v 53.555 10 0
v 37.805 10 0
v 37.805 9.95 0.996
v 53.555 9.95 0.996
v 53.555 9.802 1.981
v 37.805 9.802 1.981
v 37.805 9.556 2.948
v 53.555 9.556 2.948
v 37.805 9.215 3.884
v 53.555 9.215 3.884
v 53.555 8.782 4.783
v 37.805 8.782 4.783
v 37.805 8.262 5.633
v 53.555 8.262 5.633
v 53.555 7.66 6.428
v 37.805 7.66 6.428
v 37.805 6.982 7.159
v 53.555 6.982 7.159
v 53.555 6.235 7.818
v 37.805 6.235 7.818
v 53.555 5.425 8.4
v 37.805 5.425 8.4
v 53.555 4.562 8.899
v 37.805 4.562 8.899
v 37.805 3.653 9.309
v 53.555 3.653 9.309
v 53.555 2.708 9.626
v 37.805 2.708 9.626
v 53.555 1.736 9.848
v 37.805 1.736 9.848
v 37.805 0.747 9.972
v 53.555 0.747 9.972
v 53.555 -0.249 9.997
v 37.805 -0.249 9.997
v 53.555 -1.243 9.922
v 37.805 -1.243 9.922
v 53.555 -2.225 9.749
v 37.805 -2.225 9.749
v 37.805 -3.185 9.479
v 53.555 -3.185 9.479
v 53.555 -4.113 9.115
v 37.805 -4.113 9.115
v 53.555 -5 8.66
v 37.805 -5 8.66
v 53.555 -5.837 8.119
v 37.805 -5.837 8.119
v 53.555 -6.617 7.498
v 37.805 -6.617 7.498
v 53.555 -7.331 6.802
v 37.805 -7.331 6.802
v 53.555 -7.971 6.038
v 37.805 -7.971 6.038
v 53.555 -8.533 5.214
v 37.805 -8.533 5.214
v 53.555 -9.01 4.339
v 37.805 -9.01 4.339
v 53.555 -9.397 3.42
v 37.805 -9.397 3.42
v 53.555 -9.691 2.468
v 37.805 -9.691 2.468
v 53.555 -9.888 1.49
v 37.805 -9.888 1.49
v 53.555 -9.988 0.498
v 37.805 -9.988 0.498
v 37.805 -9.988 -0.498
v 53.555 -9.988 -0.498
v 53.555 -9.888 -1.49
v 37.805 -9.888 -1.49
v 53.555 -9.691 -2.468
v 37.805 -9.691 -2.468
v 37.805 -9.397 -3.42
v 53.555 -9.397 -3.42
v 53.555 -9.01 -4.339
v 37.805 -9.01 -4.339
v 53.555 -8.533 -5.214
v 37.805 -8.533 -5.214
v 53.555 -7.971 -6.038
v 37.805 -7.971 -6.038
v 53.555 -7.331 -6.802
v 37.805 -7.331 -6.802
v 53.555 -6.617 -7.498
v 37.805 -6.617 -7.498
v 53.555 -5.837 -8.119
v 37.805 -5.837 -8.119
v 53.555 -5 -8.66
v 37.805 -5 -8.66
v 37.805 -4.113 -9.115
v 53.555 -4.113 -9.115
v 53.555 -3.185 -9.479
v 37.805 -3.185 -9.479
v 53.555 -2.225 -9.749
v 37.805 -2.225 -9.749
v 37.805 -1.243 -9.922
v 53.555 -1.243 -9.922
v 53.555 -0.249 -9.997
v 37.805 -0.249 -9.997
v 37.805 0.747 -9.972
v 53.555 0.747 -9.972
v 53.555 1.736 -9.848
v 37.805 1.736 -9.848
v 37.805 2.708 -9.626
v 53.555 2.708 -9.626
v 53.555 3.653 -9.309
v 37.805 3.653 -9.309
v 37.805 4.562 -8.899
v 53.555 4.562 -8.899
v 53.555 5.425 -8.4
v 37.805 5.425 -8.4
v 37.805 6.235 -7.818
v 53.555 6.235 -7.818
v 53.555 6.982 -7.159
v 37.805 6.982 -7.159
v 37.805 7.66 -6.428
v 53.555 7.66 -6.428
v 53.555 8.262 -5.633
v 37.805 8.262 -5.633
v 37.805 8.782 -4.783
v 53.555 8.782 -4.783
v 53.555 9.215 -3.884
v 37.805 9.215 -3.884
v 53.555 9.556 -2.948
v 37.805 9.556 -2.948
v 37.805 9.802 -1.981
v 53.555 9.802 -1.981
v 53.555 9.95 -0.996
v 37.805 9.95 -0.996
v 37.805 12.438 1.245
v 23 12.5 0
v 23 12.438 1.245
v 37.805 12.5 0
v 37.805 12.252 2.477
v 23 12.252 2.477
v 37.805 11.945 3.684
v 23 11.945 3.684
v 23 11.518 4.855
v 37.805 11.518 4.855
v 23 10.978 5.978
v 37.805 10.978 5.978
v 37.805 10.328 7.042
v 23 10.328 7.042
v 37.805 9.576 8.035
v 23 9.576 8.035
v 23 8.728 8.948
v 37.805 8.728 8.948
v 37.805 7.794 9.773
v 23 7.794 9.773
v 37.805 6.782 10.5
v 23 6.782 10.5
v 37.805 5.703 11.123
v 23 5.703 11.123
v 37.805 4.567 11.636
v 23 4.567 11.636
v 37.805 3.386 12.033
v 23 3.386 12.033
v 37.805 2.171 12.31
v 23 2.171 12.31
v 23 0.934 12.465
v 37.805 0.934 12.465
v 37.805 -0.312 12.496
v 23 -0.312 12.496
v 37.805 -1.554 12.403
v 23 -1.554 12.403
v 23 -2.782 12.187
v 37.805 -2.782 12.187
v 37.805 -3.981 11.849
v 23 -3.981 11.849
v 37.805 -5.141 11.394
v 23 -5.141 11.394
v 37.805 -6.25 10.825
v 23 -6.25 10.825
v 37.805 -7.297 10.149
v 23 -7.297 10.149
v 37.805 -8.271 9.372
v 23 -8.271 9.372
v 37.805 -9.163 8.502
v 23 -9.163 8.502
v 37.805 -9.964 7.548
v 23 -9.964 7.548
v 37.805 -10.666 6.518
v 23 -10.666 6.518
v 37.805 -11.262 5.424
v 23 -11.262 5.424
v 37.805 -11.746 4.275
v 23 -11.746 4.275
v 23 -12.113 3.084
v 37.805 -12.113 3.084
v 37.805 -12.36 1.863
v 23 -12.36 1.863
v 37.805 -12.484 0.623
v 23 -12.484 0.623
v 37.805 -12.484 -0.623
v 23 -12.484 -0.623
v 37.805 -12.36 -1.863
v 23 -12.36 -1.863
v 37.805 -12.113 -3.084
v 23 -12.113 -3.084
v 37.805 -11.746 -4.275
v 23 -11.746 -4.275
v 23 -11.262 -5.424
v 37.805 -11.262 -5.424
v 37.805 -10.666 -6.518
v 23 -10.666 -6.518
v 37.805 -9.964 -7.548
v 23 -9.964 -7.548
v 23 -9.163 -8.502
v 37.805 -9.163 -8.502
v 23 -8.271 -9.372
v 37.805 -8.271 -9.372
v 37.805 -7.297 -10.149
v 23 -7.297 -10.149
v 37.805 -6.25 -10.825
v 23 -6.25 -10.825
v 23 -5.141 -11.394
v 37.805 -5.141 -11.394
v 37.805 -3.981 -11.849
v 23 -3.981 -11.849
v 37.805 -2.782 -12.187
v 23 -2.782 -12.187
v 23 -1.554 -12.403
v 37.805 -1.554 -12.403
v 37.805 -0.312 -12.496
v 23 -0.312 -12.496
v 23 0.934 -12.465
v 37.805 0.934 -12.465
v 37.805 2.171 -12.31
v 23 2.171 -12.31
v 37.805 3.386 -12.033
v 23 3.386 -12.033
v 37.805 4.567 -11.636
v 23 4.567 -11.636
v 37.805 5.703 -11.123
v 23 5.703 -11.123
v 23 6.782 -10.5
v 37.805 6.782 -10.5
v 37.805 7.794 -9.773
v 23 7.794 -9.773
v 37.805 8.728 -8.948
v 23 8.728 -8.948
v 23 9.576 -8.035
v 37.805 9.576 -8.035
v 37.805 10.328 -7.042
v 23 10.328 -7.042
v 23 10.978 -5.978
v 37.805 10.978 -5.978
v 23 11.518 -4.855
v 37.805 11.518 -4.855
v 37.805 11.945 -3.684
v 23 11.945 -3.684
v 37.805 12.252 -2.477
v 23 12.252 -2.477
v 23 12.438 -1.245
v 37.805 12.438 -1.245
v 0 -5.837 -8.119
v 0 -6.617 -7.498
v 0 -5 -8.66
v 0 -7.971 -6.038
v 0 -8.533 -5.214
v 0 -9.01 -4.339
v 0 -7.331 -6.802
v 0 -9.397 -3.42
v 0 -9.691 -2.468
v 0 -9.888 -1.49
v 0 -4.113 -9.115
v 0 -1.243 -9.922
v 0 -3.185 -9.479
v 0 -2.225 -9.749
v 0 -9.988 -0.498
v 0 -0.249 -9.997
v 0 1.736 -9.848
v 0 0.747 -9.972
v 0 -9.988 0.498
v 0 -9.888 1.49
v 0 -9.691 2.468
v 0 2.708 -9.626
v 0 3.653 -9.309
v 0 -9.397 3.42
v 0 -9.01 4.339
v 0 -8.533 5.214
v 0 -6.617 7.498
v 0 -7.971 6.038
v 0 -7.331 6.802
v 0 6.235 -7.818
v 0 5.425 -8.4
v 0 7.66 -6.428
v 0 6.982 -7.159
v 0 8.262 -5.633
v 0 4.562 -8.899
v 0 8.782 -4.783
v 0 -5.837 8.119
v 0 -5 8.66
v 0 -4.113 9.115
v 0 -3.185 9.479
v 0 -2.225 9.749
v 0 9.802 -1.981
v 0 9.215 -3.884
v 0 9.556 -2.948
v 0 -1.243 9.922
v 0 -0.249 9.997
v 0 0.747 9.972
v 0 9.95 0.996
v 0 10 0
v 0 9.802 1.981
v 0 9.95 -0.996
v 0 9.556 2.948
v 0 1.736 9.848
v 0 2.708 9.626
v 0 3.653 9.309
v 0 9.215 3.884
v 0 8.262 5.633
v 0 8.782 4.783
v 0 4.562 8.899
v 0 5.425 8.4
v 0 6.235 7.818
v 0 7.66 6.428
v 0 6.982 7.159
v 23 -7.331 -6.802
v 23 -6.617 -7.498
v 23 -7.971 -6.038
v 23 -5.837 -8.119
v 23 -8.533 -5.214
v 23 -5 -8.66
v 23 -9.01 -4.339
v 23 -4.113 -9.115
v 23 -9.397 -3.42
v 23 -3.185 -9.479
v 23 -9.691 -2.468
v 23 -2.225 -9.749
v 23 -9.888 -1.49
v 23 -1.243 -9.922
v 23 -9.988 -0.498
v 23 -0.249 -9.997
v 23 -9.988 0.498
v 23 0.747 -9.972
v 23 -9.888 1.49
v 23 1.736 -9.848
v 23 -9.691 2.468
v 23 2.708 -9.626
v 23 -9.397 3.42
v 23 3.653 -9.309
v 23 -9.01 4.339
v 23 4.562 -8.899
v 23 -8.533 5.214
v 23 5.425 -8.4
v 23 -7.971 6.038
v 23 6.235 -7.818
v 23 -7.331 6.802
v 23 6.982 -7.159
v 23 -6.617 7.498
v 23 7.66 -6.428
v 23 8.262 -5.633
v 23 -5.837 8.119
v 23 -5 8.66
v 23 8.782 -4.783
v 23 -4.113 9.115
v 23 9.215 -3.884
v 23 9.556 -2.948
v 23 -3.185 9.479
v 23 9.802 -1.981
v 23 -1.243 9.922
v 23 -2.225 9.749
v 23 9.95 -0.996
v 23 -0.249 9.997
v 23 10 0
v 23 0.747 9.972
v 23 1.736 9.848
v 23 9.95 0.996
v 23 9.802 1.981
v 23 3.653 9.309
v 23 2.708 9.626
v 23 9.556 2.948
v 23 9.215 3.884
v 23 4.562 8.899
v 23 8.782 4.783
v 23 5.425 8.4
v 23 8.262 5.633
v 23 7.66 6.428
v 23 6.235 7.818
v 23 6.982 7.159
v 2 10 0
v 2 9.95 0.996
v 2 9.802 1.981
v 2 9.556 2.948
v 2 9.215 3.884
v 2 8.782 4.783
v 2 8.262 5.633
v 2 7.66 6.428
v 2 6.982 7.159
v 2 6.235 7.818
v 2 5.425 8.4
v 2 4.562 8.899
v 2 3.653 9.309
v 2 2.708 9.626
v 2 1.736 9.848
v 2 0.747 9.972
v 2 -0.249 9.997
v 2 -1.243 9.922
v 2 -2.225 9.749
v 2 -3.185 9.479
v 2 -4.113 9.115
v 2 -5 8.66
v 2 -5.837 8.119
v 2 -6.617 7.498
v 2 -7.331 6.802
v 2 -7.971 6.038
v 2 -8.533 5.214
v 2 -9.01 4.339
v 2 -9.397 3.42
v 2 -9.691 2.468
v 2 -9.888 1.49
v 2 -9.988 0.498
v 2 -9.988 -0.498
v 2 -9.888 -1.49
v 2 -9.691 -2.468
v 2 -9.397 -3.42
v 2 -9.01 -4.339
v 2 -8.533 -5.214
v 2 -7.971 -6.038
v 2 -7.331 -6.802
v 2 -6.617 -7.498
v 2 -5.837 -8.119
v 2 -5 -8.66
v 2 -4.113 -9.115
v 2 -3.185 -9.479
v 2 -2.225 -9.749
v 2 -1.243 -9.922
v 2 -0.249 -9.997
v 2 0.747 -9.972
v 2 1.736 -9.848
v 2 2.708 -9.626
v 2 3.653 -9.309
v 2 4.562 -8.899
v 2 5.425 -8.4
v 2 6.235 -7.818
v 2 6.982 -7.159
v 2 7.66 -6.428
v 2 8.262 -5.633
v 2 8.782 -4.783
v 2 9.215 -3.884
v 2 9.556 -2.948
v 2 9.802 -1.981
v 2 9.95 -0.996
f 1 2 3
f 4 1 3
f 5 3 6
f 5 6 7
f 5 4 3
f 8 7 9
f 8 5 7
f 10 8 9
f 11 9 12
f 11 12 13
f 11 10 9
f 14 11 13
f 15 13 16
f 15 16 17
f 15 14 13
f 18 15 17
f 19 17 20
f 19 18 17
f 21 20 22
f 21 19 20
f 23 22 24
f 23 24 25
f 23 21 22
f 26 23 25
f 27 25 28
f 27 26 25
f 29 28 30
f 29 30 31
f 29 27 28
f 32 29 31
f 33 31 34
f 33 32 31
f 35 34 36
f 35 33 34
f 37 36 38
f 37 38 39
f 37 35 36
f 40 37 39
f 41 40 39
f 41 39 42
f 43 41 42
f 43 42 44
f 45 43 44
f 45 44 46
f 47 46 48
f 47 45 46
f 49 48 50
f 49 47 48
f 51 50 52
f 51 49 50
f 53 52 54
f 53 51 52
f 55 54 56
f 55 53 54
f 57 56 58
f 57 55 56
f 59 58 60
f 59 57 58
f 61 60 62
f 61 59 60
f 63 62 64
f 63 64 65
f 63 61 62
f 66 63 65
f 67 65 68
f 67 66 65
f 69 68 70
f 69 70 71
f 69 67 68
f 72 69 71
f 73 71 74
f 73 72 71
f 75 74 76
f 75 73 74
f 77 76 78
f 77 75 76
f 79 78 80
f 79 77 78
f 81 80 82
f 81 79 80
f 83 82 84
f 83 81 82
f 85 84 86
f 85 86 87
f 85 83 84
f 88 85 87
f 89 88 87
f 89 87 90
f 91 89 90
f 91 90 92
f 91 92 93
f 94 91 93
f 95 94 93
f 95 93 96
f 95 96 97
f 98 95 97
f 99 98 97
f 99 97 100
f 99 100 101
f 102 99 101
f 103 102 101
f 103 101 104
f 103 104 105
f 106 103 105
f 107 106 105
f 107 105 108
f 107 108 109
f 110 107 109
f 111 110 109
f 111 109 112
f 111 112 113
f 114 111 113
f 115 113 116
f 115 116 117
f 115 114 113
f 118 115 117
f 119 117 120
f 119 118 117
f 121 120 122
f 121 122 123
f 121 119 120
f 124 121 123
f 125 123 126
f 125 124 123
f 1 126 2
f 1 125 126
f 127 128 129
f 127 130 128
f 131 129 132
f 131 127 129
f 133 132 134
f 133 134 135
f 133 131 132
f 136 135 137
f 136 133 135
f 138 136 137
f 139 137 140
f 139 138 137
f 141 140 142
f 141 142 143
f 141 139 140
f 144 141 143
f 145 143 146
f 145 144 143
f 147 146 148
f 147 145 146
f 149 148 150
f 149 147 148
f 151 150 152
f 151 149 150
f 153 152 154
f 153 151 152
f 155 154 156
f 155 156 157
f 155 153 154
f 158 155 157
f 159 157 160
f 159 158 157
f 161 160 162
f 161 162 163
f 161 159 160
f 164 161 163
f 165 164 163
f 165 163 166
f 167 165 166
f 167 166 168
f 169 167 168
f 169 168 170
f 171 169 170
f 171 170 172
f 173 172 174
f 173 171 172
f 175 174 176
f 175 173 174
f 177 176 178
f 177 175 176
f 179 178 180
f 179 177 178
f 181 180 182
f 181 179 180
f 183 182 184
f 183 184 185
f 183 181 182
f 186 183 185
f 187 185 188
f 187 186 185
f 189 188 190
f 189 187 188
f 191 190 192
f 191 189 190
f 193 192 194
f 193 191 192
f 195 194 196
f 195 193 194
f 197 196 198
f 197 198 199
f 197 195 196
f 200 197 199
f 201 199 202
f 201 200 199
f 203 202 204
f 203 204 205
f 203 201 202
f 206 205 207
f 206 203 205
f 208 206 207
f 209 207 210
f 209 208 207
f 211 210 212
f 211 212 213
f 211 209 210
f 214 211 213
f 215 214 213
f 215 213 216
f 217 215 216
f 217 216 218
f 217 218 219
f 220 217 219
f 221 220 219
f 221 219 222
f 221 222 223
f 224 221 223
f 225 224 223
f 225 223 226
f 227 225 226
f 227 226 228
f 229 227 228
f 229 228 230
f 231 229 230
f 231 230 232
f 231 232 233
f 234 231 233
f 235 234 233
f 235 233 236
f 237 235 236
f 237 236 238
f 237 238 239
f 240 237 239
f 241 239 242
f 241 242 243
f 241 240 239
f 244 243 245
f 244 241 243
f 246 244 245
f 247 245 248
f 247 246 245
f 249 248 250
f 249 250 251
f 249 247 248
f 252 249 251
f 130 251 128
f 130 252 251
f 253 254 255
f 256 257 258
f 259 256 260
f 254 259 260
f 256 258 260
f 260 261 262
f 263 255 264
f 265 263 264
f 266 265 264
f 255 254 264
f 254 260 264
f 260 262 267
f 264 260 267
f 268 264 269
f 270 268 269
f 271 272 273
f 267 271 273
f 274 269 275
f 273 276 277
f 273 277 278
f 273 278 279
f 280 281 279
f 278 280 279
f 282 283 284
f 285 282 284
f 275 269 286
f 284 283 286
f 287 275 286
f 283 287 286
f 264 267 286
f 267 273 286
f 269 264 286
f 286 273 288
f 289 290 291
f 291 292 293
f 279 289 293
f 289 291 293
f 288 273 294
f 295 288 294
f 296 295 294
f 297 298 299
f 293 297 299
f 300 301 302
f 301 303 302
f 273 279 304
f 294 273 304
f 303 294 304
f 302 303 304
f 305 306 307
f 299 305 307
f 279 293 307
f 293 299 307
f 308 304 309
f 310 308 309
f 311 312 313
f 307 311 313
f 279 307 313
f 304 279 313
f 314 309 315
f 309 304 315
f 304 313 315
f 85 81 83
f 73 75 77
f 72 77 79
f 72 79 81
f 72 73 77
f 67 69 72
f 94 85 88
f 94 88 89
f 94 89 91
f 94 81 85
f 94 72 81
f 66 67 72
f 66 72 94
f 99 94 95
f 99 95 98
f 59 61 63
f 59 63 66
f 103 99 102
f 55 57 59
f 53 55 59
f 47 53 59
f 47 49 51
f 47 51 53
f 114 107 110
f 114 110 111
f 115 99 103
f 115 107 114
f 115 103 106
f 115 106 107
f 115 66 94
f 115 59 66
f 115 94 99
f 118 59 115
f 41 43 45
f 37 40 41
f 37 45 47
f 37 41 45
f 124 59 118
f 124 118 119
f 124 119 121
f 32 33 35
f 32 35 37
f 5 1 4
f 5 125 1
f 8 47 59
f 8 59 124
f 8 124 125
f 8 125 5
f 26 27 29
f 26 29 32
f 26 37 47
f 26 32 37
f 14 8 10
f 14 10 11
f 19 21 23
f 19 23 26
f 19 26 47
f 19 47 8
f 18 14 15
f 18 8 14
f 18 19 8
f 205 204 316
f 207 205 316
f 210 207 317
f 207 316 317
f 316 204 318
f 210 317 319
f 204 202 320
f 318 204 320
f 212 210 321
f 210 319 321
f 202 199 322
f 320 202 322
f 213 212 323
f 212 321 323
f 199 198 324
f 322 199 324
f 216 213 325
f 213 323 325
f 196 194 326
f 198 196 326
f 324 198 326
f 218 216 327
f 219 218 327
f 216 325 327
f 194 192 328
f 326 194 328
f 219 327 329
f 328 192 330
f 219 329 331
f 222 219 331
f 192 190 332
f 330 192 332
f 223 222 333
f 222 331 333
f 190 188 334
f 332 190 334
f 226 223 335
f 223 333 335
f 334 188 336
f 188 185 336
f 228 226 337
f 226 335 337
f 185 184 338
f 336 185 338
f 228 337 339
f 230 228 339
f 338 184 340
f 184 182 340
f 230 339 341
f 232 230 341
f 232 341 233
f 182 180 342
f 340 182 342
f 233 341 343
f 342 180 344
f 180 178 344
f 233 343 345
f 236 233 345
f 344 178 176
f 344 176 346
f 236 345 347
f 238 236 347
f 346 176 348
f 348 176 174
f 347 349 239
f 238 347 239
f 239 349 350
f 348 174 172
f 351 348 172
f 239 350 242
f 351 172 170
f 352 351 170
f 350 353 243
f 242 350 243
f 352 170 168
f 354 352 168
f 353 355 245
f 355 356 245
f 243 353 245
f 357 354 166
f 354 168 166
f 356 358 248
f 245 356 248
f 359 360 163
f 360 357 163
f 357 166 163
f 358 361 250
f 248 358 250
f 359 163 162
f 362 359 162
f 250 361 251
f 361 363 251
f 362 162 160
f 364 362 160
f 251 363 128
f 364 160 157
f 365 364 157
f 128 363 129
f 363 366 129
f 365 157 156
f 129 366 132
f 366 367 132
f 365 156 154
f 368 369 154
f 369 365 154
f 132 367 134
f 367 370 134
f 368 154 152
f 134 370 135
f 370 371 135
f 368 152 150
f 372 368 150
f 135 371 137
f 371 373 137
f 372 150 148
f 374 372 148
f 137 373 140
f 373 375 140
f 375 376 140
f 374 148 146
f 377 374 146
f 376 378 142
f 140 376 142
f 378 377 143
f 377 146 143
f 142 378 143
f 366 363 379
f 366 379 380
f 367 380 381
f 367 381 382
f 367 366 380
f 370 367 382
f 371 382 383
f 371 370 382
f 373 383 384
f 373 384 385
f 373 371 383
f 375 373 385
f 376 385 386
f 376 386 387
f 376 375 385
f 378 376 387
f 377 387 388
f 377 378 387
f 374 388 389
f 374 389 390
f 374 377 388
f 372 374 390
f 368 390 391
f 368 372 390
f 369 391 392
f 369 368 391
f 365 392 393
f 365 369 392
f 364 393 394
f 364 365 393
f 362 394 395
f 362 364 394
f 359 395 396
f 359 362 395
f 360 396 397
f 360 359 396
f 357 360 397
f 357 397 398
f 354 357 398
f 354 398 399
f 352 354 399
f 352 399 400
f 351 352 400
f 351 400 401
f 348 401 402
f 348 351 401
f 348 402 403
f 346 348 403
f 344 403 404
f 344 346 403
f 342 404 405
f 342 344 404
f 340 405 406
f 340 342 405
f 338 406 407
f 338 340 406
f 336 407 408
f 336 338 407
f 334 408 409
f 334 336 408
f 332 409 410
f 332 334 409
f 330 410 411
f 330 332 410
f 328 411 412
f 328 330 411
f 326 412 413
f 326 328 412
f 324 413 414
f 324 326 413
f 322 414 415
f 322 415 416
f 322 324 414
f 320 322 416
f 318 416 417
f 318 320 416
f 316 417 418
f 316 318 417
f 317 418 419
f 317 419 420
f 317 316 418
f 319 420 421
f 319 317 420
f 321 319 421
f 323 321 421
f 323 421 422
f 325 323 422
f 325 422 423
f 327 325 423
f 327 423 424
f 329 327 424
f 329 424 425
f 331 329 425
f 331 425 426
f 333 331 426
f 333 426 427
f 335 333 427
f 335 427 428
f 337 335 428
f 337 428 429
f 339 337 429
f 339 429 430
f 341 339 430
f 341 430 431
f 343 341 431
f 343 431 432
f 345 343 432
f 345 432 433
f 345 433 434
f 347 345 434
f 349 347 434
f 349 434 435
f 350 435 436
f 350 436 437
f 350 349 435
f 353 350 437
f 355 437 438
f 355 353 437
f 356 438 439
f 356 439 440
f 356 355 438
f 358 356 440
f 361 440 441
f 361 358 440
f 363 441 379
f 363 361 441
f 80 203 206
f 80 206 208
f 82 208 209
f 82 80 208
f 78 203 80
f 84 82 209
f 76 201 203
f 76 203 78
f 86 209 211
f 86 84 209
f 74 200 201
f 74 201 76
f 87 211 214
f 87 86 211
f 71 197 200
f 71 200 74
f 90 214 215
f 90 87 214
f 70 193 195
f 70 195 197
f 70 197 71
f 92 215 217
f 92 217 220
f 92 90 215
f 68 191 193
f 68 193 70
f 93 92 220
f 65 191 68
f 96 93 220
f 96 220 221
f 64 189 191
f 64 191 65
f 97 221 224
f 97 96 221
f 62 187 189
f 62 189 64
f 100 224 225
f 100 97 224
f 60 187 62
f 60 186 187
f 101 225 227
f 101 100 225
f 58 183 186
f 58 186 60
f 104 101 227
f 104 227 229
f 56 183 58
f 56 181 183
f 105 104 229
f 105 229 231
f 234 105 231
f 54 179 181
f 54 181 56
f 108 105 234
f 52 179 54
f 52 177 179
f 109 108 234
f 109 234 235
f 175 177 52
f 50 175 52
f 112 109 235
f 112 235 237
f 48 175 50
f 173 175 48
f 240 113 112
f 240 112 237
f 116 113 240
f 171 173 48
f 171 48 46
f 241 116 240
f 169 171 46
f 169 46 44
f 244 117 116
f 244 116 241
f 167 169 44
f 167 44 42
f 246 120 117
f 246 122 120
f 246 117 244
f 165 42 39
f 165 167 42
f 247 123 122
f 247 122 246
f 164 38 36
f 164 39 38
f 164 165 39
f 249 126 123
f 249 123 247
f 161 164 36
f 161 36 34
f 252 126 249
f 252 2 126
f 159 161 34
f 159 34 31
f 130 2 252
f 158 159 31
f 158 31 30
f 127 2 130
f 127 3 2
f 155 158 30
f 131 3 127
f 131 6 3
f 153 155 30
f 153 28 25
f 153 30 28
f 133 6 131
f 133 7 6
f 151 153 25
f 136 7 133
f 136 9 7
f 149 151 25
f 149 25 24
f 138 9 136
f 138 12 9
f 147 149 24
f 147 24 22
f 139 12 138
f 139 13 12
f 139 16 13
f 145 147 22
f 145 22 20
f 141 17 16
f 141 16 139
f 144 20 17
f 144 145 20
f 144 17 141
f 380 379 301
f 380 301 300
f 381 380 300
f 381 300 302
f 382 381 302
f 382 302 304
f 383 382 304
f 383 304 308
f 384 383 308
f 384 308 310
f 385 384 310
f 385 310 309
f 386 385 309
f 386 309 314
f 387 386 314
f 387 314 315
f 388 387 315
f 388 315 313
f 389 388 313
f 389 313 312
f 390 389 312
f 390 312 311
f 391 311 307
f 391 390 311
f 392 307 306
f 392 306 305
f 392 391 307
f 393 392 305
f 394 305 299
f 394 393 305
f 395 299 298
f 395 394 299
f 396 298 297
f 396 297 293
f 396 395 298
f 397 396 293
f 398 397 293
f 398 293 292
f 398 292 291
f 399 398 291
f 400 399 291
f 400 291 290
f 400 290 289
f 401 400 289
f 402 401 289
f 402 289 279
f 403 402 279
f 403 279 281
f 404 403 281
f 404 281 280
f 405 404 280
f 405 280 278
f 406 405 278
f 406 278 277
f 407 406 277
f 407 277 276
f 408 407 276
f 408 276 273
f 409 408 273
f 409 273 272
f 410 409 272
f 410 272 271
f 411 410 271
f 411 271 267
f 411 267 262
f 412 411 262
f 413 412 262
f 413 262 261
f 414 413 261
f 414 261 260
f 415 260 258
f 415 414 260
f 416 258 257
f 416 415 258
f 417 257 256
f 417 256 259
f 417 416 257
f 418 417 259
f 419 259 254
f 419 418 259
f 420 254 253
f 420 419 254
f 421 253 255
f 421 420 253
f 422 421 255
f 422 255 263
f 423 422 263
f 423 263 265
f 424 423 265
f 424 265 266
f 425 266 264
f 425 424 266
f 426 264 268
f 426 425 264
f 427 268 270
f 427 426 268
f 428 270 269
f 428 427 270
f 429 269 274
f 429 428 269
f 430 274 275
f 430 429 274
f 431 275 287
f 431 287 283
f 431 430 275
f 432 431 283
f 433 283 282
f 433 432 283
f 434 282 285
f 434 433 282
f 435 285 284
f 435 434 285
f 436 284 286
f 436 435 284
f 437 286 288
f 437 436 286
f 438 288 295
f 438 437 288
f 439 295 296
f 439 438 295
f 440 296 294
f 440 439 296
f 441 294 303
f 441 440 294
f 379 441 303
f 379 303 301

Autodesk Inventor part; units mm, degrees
ref_plane "YZ Plane" through (0, 0, 0) normal (1, 0, 0) x (0, 1, 0)
ref_plane "XZ Plane" through (0, 0, 0) normal (0, 1, 0) x (-1, 0, 0)
ref_plane "XY Plane" through (0, 0, 0) normal (0, 0, 1) x (1, 0, 0)
sketch "Эскиз1" plane through (0, 0, 0) normal (0, 0, 1) x (1, 0, 0)
  line L0 (0, 0) -> (53.555, 0)
  line L1 (0, 0) -> (0, 10)
  line L2 (37.805, 12.5) -> (37.805, 10)
  line L3 (37.805, 10) -> (53.555, 10)
  line L4 (53.555, 10) -> (53.555, 0)
  line L5 (2, 10) -> (2, 10)
  line L6 (2, 10) -> (23, 10)
  line L7 (23, 10) -> (23, 12.5)
  line L8 (0, 10) -> (2, 10)
  line L9 (23, 12.5) -> (37.805, 12.5)
  dimension "d0" = 20
  dimension "d2" = 15.75
  dimension "d5" = 20
  dimension "d6" = 21
  dimension "d7" = 2
  dimension "d8" = 20
  dimension "d9" = 25
  dimension "d10" = 37.805
revolve "Вращение1" add sketch "Эскиз1" angle 360 about axis through (0, 0, 0) along (1, 0, 0)
properties part number "Валл_резина"
